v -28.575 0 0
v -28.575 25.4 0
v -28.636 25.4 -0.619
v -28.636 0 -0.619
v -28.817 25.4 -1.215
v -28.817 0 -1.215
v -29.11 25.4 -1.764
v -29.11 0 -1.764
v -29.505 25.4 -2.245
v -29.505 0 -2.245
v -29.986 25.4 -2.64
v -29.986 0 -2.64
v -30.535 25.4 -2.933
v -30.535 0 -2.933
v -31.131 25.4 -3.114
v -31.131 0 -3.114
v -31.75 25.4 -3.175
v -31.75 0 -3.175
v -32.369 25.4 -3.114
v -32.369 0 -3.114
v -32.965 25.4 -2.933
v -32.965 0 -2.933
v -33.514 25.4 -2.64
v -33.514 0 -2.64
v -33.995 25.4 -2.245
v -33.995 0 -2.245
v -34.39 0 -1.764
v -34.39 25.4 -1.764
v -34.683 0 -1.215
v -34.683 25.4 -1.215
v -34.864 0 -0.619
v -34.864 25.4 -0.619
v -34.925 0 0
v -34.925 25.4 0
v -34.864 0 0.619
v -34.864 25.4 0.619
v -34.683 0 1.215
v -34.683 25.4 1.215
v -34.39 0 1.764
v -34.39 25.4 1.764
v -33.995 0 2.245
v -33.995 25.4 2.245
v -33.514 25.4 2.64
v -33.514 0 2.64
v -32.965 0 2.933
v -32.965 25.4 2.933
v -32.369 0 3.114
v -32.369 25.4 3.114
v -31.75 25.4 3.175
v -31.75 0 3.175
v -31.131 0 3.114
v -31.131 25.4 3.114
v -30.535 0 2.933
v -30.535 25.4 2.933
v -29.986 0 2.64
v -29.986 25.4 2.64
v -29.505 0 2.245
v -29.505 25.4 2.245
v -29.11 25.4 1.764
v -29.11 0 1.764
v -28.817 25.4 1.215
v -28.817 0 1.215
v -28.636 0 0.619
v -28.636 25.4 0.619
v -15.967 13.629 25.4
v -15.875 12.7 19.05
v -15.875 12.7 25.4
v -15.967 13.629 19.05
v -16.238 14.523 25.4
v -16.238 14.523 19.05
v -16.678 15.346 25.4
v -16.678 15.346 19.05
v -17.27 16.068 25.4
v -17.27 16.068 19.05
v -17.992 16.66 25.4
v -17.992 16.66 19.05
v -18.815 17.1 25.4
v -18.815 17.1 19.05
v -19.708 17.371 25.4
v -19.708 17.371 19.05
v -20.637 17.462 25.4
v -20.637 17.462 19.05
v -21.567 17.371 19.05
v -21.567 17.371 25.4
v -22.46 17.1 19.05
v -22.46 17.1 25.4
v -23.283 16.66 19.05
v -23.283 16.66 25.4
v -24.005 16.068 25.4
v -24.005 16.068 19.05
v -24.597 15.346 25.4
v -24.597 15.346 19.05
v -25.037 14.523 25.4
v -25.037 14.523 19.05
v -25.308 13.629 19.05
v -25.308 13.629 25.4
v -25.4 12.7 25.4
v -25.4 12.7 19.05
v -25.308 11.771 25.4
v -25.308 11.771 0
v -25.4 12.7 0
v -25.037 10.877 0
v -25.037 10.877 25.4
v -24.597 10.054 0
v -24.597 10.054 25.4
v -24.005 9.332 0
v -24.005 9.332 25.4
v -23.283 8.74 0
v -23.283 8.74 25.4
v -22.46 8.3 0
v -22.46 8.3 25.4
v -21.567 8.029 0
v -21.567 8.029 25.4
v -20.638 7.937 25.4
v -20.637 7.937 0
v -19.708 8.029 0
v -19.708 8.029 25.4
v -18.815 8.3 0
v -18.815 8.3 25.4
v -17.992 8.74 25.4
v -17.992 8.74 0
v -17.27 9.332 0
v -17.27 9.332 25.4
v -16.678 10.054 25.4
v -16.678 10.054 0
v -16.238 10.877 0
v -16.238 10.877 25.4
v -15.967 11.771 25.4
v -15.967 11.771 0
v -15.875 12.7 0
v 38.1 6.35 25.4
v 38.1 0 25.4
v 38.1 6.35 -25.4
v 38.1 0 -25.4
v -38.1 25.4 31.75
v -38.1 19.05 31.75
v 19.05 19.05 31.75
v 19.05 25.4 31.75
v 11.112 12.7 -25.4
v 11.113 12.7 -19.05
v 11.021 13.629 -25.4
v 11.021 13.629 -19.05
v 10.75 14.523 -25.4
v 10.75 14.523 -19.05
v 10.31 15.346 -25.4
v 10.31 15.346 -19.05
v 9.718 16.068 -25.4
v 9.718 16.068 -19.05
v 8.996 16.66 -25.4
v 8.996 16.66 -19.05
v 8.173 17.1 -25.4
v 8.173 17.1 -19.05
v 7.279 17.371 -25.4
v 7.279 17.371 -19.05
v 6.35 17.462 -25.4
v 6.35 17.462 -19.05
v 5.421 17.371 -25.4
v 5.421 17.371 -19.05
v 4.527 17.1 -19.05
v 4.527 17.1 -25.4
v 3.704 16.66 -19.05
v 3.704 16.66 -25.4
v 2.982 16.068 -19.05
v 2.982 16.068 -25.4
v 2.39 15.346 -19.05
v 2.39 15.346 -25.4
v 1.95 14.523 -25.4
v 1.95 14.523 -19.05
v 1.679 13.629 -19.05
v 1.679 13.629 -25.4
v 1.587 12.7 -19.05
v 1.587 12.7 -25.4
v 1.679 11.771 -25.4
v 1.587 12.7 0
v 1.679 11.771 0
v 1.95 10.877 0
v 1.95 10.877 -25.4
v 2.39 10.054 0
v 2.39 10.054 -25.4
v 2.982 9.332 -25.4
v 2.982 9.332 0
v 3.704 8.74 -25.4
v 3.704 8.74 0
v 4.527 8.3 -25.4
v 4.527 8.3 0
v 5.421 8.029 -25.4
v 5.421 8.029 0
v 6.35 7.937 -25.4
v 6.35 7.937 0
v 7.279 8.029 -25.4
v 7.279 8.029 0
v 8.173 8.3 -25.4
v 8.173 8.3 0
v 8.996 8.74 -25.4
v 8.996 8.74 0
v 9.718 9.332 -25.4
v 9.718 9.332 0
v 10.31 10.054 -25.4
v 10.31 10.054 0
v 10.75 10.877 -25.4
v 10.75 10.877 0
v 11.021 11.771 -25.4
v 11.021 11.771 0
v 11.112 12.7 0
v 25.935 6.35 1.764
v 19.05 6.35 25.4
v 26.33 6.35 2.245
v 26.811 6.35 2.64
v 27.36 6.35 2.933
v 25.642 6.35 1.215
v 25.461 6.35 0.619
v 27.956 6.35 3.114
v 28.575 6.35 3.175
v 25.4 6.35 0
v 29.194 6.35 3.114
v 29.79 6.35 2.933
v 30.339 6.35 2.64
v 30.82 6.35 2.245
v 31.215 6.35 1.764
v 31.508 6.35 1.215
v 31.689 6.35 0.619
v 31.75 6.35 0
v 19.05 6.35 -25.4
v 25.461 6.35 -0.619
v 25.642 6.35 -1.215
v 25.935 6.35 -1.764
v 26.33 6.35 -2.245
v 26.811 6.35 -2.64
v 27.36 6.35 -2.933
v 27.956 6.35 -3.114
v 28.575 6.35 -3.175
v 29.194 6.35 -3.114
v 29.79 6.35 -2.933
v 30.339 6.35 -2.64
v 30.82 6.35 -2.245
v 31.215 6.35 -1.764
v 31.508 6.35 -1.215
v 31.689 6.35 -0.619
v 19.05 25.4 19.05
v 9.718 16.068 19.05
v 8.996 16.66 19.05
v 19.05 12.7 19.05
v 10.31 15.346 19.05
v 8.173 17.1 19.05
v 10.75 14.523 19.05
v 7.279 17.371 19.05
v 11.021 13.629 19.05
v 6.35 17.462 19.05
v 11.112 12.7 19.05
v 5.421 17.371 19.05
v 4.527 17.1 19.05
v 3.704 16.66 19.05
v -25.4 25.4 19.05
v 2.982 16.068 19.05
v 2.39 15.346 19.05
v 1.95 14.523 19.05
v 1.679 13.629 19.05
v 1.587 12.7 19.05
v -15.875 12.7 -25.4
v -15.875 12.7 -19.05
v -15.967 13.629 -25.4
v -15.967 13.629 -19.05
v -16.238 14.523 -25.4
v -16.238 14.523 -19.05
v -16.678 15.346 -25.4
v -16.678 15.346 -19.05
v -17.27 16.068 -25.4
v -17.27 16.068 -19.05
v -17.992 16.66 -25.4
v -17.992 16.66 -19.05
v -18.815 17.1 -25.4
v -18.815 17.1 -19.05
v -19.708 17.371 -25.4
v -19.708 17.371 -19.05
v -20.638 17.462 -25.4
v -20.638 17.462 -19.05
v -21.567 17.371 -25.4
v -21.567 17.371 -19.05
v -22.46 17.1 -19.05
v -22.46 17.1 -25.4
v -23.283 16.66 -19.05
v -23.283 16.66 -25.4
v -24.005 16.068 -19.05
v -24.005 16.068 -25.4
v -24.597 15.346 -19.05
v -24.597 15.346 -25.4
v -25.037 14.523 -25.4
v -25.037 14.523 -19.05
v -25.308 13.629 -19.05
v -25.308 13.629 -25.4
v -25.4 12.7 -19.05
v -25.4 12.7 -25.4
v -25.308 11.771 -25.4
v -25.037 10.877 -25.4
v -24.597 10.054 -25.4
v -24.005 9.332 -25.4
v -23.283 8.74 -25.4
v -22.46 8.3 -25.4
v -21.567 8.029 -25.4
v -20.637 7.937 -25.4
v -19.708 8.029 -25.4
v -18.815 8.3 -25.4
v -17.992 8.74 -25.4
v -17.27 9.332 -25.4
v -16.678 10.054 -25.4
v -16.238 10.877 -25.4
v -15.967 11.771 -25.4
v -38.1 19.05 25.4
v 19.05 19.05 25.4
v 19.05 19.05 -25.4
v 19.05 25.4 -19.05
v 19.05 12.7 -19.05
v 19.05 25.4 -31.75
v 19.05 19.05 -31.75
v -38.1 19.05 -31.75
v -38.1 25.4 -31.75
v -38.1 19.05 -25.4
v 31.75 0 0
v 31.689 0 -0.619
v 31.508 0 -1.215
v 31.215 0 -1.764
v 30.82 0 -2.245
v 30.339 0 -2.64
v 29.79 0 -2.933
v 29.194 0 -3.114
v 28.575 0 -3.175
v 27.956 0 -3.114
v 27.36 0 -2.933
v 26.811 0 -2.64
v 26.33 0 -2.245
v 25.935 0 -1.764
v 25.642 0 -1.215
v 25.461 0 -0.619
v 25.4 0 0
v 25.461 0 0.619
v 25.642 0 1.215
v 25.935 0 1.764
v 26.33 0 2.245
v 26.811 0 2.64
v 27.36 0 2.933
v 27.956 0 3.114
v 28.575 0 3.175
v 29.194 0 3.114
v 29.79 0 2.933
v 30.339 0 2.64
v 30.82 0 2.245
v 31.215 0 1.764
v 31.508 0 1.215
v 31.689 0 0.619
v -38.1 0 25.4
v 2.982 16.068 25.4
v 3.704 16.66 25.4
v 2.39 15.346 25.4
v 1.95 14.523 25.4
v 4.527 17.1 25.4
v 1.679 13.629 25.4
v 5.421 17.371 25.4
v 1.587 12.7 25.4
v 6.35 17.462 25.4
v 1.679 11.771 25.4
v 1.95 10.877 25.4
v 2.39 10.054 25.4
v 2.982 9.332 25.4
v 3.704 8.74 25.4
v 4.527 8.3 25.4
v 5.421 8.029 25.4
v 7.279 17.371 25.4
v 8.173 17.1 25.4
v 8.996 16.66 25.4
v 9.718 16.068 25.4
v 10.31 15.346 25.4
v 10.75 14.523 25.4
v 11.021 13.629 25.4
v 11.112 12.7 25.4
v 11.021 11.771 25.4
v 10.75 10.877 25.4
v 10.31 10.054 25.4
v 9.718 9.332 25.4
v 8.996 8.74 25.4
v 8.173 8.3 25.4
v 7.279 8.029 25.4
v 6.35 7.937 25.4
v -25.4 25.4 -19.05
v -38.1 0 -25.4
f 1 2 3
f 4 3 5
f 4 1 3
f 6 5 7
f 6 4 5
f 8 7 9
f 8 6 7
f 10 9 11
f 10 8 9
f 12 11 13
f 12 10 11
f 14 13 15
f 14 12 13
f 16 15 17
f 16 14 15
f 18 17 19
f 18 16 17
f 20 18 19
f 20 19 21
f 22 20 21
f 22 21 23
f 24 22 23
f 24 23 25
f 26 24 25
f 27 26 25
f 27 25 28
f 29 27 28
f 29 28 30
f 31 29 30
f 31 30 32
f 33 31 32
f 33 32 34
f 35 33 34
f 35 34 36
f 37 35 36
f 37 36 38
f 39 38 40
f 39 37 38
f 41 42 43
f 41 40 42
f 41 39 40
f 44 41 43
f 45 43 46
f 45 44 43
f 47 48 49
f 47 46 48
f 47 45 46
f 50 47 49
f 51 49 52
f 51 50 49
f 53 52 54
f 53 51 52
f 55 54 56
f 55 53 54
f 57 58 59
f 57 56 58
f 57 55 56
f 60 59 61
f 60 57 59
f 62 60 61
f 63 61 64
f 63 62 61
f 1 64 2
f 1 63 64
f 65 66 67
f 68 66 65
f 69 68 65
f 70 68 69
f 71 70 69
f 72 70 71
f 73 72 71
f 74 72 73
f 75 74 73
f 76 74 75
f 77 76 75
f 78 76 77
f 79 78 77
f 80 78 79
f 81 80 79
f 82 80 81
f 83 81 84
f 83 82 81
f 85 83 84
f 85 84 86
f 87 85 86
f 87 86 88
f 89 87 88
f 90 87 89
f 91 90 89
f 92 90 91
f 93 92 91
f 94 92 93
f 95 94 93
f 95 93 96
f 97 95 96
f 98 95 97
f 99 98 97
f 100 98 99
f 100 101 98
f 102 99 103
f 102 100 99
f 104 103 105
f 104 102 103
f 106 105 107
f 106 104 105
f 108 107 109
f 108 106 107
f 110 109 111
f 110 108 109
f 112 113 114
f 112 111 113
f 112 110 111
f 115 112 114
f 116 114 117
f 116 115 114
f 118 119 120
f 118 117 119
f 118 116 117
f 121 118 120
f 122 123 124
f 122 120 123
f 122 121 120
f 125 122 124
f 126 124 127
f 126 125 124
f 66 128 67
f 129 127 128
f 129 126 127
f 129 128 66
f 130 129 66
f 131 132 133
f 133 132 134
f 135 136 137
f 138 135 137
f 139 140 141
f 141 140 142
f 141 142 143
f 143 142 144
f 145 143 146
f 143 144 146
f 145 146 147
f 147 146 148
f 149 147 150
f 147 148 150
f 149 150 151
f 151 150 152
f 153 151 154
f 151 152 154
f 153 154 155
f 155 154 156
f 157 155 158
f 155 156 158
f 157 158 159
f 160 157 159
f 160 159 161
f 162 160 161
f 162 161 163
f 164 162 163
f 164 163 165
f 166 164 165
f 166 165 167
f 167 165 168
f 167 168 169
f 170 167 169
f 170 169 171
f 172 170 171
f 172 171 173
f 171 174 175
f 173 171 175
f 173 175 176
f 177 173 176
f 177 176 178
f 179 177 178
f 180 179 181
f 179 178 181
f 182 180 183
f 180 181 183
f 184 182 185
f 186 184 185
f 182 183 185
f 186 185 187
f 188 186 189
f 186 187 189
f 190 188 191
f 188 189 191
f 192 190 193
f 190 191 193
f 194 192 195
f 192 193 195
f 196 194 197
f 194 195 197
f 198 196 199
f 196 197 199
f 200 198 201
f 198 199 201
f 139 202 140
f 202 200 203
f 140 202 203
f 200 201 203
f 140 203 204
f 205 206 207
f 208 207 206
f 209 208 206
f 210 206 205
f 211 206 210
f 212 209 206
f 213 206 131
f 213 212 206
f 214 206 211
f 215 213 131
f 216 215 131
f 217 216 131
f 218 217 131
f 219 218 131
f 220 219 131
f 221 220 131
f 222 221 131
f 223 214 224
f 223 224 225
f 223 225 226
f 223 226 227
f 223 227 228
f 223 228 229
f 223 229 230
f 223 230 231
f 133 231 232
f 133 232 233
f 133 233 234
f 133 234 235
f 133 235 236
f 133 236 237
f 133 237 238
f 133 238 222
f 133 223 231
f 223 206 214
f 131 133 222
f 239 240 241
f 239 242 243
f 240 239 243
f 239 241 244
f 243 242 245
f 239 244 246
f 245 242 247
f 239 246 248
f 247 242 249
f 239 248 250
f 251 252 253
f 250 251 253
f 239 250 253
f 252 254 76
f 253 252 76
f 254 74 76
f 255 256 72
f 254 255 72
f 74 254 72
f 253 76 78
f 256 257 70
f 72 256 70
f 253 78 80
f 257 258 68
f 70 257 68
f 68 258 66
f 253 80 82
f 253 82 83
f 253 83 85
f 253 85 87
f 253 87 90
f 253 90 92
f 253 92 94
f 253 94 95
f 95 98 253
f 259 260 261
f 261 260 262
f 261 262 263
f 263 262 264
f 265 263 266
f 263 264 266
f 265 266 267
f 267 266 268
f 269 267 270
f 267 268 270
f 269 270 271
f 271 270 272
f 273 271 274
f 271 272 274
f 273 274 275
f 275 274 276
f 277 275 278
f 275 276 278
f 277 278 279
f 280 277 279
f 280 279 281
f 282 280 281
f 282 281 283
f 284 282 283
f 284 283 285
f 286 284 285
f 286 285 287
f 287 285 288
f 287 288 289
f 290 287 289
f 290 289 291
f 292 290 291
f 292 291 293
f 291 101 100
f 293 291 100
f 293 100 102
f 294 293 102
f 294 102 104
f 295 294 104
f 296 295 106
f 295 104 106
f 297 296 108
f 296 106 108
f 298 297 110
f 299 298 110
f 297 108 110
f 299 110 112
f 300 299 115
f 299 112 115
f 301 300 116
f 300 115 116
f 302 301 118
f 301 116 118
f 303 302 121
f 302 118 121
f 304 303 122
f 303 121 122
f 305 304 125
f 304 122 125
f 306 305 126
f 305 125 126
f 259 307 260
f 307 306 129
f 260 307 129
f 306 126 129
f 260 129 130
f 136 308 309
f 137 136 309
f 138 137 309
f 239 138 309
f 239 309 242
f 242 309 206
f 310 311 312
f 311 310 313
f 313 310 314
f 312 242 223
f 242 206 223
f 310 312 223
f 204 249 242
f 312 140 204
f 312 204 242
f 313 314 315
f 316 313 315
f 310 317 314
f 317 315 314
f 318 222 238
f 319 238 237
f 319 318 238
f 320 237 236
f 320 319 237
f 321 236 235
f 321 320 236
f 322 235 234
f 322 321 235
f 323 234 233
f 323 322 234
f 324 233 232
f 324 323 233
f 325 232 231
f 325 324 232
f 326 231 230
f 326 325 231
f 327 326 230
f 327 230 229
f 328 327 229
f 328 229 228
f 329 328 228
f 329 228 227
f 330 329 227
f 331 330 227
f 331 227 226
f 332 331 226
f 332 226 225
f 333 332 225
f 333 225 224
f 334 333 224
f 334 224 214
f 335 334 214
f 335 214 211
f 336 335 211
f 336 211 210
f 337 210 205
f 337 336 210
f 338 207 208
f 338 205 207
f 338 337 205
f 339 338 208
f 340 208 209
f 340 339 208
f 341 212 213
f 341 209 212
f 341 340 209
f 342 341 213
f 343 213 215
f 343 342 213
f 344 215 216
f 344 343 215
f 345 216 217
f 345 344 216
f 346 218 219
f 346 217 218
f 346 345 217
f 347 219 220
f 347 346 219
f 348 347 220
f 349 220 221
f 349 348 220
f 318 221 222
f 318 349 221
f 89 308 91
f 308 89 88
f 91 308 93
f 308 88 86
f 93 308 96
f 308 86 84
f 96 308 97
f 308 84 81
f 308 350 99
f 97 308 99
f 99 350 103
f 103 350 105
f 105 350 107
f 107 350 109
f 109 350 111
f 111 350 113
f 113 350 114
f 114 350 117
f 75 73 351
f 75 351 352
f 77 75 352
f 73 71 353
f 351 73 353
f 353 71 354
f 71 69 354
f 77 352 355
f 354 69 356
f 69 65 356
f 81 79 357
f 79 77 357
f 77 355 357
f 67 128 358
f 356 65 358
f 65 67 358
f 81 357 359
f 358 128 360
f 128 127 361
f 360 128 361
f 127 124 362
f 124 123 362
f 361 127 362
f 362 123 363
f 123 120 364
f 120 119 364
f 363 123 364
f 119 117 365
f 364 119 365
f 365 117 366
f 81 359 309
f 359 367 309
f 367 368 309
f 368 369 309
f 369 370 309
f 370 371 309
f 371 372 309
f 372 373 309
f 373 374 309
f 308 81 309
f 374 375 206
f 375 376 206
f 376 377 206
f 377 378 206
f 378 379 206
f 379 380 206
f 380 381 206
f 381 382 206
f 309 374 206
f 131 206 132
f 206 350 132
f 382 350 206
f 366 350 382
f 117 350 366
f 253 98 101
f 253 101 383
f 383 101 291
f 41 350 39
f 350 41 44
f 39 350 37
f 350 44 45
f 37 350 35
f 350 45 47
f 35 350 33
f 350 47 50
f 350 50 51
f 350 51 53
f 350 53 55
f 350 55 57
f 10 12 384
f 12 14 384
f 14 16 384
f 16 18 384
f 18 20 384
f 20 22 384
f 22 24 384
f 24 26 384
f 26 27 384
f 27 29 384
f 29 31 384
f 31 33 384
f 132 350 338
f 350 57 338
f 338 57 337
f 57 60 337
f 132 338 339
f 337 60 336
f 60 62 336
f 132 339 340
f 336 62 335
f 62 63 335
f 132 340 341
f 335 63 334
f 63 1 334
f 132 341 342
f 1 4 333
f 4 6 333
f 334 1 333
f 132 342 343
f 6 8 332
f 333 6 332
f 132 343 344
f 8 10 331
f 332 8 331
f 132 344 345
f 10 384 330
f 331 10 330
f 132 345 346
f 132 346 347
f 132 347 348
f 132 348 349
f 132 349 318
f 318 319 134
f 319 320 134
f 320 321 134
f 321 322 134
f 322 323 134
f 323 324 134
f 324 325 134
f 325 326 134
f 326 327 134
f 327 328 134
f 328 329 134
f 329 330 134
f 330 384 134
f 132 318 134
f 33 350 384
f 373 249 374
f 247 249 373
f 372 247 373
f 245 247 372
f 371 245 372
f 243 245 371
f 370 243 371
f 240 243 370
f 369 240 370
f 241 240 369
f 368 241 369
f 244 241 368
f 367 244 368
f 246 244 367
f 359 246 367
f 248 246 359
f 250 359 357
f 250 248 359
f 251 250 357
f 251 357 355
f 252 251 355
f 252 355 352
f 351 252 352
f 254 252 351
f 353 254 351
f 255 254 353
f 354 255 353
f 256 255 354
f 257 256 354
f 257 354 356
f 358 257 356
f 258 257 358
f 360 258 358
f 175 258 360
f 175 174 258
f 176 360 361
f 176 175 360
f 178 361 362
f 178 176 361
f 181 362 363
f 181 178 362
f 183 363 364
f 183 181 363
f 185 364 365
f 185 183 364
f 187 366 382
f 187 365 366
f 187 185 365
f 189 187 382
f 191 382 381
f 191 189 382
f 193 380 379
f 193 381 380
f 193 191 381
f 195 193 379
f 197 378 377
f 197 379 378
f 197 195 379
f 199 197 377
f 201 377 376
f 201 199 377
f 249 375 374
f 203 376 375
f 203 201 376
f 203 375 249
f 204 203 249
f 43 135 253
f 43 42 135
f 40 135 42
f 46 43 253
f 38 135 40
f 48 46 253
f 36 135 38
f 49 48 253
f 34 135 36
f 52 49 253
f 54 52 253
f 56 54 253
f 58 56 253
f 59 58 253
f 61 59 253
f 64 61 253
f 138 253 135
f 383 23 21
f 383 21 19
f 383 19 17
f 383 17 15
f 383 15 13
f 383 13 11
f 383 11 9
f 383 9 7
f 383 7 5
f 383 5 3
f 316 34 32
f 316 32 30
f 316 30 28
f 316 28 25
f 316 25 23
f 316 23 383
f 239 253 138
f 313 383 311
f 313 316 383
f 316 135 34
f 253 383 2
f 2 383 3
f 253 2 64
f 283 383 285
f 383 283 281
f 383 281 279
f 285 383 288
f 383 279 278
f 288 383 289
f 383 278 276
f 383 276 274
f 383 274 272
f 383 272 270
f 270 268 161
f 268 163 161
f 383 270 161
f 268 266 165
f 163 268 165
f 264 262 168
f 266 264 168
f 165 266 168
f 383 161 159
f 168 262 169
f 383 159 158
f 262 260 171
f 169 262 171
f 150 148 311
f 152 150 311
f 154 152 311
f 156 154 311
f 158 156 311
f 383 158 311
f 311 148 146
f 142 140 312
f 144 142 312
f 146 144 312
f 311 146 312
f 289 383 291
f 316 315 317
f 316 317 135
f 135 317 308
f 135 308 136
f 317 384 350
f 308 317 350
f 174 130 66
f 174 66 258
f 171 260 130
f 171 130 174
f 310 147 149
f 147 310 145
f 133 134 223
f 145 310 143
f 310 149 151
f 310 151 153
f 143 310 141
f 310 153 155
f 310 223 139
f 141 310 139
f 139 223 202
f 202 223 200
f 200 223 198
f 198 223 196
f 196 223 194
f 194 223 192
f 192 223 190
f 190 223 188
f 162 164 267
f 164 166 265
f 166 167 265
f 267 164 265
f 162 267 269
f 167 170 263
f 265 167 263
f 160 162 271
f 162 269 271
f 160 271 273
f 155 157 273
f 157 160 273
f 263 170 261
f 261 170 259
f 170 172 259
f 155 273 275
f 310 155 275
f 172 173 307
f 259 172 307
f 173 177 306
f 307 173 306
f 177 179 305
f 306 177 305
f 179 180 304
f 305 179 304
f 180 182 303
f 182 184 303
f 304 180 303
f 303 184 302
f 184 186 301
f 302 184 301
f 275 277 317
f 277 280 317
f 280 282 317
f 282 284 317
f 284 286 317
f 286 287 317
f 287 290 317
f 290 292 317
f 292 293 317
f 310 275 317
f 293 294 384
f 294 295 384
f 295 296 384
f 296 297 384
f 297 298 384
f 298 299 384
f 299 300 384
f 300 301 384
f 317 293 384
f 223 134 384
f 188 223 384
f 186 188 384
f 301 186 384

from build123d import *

# Parameters (mm, degrees)
SKETCH1_W               = 76.2
SKETCH1_H               = 50.8
BOSS_EXTRUDE1_DEPTH     = 6.35
SKETCH2_W               = 57.15
SKETCH2_H               = 50.8
BOSS_EXTRUDE2_DEPTH     = 6.35
BOSS_EXTRUDE3_DEPTH     = 6.35
BOSS_EXTRUDE4_DEPTH     = 6.35
SKETCH5_R               = 3.175
CUT_EXTRUDE1_DEPTH      = 26.4
SKETCH6_R               = 4.7625
CUT_EXTRUDE2_DEPTH      = 32.75
CUT_EXTRUDE2_DEPTH_BACK = 32.75


with BuildPart() as part:
    # Sketch1 → Boss-Extrude1 (new body)
    with BuildSketch(Plane(origin=(0, 0, 0), x_dir=(1, 0, 0), z_dir=(0, 1, 0))):
        Rectangle(SKETCH1_W, SKETCH1_H)
    extrude(amount=BOSS_EXTRUDE1_DEPTH)

    # Sketch2 → Boss-Extrude2 (add)
    with BuildSketch(Plane(origin=(0, 6.35, 0), x_dir=(1, 0, 0), z_dir=(0, 1, 0))):
        with Locations((-9.525, 0)):
            Rectangle(SKETCH2_W, SKETCH2_H)
    extrude(amount=BOSS_EXTRUDE2_DEPTH)

    # Sketch3 → Boss-Extrude3 (add)
    with BuildSketch(Plane(origin=(0, 12.7, 0), x_dir=(1, 0, 0), z_dir=(0, 1, 0))):
        Polygon((19.05, 25.4), (-38.1, 25.4), (-38.1, -25.4), (19.05, -25.4), (19.05, -19.05), (-25.4, -19.05), (-25.4, 19.05), (19.05, 19.05), align=None)
    extrude(amount=BOSS_EXTRUDE3_DEPTH)

    # Sketch4 → Boss-Extrude4 (add)
    with BuildSketch(Plane(origin=(0, 19.05, 0), x_dir=(1, 0, 0), z_dir=(0, 1, 0))):
        Polygon((19.05, 19.05), (19.05, 31.75), (-38.1, 31.75), (-38.1, -31.75), (19.05, -31.75), (19.05, -19.05), (-25.4, -19.05), (-25.4, 19.05), align=None)
    extrude(amount=BOSS_EXTRUDE4_DEPTH)

    # Sketch5 → Cut-Extrude1 (cut, through all)
    with BuildSketch(Plane(origin=(0, 0, 0), x_dir=(1, 0, 0), z_dir=(0, 1, 0))):
        with Locations((-31.75, 0)):
            Circle(SKETCH5_R)
        with Locations((28.575, 0)):
            Circle(SKETCH5_R)
    extrude(amount=CUT_EXTRUDE1_DEPTH, mode=Mode.SUBTRACT)

    # Sketch6 → Cut-Extrude2 (cut, two sides)
    with BuildSketch(Plane.XY) as cut_extrude2_sk:
        with Locations((-20.6375, 12.7)):
            Circle(SKETCH6_R)
        with Locations((6.35, 12.7)):
            Circle(SKETCH6_R)
    extrude(amount=CUT_EXTRUDE2_DEPTH, mode=Mode.SUBTRACT)
    extrude(cut_extrude2_sk.sketch, amount=-CUT_EXTRUDE2_DEPTH_BACK, mode=Mode.SUBTRACT)


solid = part.part
